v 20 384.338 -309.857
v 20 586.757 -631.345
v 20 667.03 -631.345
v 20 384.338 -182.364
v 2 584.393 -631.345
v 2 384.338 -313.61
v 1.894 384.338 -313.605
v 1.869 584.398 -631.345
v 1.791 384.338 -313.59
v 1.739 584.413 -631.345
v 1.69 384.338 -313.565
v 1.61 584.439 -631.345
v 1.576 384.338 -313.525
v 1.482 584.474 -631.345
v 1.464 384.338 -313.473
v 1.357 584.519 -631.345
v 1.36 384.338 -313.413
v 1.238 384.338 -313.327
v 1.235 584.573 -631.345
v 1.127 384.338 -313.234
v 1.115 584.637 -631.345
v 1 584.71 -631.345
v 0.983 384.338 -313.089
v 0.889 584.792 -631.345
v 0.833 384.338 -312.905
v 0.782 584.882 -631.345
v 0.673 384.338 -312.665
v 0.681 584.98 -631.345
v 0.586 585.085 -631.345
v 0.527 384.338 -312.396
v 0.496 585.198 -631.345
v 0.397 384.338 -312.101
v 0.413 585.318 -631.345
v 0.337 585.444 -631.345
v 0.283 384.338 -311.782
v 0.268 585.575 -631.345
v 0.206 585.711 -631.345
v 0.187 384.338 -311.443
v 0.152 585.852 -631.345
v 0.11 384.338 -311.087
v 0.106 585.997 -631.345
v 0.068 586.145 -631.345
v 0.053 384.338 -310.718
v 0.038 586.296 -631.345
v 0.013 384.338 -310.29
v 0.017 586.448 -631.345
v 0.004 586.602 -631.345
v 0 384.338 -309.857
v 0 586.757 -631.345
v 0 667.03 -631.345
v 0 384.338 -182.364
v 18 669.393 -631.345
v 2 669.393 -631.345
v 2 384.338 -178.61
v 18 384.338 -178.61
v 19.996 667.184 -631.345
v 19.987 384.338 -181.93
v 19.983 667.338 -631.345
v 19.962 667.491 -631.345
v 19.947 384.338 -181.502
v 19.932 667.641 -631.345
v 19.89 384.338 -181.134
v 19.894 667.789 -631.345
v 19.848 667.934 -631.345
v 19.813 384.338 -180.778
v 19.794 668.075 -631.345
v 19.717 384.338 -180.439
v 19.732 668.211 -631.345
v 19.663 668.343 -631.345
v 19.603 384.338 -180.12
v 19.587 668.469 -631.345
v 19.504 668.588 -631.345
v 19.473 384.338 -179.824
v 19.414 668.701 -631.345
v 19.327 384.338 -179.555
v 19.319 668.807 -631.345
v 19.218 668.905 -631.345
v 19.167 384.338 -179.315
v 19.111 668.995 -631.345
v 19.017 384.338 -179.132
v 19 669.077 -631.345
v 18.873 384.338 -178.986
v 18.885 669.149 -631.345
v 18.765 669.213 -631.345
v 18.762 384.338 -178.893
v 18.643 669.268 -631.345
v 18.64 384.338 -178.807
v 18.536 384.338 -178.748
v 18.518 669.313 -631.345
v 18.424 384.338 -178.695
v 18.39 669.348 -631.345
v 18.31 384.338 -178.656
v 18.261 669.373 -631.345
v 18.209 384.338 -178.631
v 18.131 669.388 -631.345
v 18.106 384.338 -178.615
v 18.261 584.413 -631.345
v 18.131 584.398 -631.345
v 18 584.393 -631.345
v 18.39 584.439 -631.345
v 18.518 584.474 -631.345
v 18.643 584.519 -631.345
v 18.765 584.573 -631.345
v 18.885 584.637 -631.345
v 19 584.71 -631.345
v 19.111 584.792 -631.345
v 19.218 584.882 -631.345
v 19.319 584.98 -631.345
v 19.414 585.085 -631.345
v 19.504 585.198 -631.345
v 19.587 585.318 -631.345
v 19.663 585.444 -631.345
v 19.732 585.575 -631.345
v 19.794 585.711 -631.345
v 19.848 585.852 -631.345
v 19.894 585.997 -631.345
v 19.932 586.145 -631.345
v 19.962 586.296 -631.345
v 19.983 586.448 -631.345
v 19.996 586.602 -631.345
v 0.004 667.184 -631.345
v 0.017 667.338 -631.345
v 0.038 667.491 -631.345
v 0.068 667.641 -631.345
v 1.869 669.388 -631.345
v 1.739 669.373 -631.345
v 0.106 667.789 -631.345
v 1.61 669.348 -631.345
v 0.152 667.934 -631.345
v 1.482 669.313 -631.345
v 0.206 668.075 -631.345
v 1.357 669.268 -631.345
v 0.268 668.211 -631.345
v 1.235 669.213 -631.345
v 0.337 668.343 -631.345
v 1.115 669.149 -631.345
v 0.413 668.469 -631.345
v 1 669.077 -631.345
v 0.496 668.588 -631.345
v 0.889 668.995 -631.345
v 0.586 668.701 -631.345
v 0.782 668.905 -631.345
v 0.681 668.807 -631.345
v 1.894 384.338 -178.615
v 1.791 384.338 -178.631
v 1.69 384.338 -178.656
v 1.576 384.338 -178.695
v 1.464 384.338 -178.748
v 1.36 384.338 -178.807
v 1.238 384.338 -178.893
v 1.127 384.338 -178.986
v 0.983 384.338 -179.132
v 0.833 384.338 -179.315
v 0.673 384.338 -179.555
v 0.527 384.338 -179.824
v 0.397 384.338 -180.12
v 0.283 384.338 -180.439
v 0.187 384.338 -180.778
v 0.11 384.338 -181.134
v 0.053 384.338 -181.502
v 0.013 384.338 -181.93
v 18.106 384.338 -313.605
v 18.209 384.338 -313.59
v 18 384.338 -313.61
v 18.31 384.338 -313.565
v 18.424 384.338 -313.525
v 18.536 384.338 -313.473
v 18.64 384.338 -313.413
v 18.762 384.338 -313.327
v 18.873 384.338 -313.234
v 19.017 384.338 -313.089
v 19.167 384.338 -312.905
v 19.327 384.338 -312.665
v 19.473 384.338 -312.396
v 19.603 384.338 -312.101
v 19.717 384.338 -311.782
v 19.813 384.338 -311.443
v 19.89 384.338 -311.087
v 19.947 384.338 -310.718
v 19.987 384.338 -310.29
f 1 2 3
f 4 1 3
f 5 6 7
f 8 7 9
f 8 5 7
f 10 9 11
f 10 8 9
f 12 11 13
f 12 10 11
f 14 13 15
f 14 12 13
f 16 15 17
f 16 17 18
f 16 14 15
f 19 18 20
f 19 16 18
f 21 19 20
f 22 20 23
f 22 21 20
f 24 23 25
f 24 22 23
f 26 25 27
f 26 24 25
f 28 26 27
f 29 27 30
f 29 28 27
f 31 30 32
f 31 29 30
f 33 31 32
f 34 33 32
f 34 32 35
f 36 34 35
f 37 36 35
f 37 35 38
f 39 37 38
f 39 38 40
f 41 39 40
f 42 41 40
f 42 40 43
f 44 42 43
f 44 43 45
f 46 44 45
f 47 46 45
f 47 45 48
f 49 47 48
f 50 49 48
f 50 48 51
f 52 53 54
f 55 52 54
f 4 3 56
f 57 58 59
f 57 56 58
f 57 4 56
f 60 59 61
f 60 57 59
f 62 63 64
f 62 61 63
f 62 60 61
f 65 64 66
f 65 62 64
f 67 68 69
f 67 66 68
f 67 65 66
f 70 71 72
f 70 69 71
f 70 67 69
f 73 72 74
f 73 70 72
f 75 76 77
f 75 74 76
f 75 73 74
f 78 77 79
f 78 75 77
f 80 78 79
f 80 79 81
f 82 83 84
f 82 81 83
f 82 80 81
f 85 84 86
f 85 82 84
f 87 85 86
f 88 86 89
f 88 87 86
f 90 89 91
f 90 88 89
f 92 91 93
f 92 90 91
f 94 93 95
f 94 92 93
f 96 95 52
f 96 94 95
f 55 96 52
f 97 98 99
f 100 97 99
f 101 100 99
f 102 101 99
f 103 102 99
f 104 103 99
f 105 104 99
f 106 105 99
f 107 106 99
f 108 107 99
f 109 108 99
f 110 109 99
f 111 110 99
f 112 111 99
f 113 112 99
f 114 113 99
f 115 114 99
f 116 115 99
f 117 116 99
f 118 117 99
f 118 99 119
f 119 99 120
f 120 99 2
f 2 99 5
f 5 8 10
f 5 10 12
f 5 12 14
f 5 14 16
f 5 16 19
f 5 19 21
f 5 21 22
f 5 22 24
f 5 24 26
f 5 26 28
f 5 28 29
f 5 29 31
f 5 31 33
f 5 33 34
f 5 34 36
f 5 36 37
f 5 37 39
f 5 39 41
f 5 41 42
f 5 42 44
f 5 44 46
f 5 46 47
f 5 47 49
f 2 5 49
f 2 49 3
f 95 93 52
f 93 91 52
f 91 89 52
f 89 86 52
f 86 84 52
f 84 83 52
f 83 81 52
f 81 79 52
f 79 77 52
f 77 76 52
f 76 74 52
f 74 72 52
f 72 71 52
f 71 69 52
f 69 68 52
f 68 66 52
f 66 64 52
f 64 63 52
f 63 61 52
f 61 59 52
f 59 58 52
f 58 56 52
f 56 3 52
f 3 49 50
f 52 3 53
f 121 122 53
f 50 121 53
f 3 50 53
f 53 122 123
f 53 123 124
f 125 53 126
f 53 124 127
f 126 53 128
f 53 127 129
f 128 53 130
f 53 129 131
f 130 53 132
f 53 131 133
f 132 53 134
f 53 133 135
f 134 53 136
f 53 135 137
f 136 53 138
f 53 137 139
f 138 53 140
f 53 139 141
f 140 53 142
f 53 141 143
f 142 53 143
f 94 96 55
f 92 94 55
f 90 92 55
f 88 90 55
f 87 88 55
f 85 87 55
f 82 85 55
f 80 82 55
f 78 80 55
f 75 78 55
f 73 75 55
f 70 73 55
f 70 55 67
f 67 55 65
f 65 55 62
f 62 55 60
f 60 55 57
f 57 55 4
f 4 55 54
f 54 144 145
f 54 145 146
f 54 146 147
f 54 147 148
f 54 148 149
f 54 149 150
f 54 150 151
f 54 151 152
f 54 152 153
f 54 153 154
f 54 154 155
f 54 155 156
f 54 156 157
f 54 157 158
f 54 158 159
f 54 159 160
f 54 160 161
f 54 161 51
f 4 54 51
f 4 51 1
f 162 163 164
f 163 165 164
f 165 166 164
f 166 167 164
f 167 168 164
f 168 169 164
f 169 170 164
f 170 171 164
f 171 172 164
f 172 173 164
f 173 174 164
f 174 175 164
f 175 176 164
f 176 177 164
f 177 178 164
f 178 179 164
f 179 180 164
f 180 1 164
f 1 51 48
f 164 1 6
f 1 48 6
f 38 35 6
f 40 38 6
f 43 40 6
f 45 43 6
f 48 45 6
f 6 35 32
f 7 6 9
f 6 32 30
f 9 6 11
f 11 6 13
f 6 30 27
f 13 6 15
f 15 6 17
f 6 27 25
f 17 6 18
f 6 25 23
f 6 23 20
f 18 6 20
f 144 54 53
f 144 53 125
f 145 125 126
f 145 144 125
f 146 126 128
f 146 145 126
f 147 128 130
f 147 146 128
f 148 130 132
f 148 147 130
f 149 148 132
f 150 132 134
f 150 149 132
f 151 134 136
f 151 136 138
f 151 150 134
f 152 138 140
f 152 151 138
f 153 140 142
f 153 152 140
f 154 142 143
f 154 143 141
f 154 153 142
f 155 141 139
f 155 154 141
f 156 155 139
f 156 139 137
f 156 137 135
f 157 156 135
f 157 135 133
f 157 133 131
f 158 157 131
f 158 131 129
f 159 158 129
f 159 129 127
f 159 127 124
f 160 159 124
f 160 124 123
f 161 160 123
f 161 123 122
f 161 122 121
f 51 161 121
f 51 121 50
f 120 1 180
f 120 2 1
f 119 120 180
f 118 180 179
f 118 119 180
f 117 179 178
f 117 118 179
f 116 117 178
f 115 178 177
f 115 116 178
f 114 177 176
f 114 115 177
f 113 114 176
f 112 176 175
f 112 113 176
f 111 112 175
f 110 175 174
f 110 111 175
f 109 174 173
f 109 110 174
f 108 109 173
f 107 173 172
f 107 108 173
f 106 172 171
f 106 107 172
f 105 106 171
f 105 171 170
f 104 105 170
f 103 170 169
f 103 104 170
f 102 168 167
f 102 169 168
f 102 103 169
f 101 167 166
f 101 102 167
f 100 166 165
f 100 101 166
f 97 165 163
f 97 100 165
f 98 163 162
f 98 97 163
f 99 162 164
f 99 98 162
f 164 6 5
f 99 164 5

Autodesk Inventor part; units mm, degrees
ref_plane "YZ Plane" through (0, 0, 0) normal (1, 0, 0) x (0, 1, 0)
ref_plane "XZ Plane" through (0, 0, 0) normal (0, 1, 0) x (-1, 0, 0)
ref_plane "XY Plane" through (0, 0, 0) normal (0, 0, 1) x (1, 0, 0)
sketch "Skizze1" plane through (0, 0, 0) normal (1, 0, 0) x (0, 1, 0)
  line L0 (384.3381, -178.6102) -> (384.3381, -313.6102)
  line L1 (384.3381, -313.6102) -> (584.3932, -631.3447)
  line L2 (584.3932, -631.3447) -> (669.3932, -631.3447)
  line L3 (669.3932, -631.3447) -> (384.3381, -178.6102)
  point P0 (0, 0)
  dimension "d0" = 135
  dimension "d1" = 85
  dimension "d2" = 535
  dimension "d3" = 375.4694
extrude "Extrusion1" add sketch "Skizze1" along normal blind 20
fillet "Rundung1" radius 2 4 edges at (20, 526.8656, -404.9774) (0, 526.8656, -404.9774) (20, 484.3656, -472.4774) (0, 484.3656, -472.4774)
properties part number "VerstaerkungHintenSchraeg"
